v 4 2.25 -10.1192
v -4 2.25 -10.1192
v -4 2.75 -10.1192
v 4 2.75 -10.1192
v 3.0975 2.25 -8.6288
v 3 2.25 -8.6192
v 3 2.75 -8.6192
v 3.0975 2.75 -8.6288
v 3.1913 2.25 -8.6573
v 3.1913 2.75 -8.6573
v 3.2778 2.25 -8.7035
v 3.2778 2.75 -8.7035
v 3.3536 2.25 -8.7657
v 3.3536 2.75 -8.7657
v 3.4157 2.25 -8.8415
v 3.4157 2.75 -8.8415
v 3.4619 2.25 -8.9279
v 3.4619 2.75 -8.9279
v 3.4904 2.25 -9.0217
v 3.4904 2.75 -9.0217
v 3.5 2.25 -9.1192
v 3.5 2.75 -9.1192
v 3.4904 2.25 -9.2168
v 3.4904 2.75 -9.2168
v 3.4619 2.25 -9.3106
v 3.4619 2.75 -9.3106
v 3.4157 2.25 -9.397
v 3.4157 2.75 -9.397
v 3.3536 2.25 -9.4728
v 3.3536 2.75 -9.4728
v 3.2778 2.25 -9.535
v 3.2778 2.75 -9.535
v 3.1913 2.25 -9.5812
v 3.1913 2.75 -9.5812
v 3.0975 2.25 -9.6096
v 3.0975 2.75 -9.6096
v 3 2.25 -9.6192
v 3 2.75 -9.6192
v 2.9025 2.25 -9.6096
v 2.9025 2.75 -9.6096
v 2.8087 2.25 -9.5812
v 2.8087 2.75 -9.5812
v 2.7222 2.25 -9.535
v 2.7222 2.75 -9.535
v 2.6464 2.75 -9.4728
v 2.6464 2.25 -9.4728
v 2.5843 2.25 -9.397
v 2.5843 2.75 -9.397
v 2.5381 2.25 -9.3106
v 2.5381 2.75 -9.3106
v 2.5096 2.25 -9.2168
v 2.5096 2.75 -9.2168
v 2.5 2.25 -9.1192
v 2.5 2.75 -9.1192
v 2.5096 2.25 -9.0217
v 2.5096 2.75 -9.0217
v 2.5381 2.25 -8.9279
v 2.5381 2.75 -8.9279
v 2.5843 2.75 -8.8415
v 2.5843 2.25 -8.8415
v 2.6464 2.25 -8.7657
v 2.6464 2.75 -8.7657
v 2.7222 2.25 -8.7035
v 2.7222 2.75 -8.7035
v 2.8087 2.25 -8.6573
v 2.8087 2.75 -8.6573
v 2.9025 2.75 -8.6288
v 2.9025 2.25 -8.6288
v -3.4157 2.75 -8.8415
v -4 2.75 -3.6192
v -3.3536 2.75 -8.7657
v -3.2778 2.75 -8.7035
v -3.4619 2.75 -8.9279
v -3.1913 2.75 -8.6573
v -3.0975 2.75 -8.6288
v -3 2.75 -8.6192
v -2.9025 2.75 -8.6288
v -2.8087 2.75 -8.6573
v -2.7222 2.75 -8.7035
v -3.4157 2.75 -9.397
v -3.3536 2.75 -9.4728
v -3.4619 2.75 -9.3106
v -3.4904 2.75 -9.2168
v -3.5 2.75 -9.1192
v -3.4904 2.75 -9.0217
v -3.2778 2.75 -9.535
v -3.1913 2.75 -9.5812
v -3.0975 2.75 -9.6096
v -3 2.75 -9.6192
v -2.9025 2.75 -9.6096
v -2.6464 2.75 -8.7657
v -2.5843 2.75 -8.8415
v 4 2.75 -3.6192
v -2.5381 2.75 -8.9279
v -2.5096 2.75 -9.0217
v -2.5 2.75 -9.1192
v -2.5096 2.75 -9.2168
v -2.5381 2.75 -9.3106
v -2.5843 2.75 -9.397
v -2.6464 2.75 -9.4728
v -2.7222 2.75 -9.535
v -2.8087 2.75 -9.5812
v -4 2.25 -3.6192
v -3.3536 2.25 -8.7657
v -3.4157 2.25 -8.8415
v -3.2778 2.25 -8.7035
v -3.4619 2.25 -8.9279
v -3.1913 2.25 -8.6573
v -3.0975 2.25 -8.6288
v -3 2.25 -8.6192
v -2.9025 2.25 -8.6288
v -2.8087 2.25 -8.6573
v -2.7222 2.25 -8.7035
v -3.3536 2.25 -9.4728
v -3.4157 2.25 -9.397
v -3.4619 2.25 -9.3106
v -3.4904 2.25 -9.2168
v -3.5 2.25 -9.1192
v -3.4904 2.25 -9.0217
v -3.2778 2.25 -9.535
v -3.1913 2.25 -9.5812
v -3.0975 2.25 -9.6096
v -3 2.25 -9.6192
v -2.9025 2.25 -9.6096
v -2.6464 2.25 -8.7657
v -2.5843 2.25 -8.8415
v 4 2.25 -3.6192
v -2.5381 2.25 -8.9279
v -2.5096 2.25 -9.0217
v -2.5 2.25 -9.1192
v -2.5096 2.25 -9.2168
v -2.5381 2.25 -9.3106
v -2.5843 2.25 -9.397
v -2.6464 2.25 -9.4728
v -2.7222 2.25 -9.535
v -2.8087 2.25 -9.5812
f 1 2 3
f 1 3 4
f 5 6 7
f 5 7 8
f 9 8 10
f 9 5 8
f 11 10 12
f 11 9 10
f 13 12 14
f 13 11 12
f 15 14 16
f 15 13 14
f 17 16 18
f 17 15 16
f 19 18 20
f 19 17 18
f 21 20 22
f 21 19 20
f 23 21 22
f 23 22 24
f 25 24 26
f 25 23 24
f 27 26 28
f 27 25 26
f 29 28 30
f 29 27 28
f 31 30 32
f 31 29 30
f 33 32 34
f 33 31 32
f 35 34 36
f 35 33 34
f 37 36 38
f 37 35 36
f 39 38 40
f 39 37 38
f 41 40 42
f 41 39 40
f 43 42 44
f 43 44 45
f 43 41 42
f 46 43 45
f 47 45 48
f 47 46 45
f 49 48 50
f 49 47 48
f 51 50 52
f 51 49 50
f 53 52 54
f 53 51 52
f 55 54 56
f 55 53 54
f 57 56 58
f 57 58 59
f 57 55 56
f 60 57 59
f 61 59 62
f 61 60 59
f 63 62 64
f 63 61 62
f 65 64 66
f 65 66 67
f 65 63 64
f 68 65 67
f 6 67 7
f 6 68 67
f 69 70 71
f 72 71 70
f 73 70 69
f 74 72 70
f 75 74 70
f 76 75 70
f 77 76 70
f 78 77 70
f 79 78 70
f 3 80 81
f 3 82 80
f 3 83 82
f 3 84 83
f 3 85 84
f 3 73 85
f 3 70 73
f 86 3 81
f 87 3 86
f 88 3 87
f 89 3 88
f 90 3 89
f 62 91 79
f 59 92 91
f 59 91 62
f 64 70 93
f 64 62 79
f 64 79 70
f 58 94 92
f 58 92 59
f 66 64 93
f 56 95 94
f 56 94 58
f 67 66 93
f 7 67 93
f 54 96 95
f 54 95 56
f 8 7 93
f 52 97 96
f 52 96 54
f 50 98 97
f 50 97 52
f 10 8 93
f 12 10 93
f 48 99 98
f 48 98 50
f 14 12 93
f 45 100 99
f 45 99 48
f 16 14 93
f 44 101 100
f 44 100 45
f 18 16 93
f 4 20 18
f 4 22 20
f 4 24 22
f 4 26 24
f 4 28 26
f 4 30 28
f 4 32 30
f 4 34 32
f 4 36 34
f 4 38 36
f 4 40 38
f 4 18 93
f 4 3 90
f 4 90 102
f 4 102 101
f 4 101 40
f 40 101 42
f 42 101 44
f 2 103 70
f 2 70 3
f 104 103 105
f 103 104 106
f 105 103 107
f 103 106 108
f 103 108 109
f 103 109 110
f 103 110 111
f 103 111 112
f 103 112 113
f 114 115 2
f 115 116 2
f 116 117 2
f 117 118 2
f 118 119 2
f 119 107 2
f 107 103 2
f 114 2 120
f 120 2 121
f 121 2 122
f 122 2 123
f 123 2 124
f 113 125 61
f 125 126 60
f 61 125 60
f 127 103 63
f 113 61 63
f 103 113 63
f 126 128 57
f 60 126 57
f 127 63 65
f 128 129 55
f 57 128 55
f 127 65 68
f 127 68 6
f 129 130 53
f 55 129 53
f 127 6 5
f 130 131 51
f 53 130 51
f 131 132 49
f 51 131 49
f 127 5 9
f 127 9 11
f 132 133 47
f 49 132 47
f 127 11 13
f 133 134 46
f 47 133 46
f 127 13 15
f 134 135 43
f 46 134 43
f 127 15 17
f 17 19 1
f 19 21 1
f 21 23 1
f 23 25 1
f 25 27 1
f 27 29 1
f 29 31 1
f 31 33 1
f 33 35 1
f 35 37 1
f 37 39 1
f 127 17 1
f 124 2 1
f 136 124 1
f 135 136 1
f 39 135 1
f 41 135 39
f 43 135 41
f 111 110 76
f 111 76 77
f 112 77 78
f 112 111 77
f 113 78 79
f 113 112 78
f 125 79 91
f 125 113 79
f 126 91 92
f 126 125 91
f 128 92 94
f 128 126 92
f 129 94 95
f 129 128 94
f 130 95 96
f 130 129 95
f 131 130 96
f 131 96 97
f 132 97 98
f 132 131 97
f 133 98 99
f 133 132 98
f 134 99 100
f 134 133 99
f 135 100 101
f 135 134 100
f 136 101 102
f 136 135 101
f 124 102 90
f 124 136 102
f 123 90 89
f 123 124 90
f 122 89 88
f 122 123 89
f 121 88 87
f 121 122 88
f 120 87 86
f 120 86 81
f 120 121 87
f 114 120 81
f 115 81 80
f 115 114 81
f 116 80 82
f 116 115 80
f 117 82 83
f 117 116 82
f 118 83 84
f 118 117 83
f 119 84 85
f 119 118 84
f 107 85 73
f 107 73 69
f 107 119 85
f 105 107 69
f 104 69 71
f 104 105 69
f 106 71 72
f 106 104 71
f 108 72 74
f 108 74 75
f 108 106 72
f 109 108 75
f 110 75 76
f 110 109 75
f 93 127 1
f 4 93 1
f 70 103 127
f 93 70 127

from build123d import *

# Parameters (mm, degrees)
SKETCH1_W           = 80
SKETCH1_H           = 65
SKETCH1_R           = 5
BOSS_EXTRUDE1_DEPTH = 5
SCALE2_SCALE        = 0.1


with BuildPart() as part:
    # Sketch1 → Boss-Extrude1 (new body)
    with BuildSketch(Plane(origin=(0, 0, 0), x_dir=(1, 0, 0), z_dir=(0, 1, 0))):
        with Locations((0, 7.5)):
            Rectangle(SKETCH1_W, SKETCH1_H)
        with Locations(Location((-30, 30, 0), (0, 0, 270))):
            Circle(SKETCH1_R, mode=Mode.SUBTRACT)
        with Locations(Location((30, 30, 0), (0, 0, 270))):
            Circle(SKETCH1_R, mode=Mode.SUBTRACT)
    extrude(amount=BOSS_EXTRUDE1_DEPTH)


with BuildPart() as part_1:
    # Scale2: scaled about (0, 2.5, -6.799157734)
    add(part.part.scale(SCALE2_SCALE).moved(Location((0, 2.25, -6.119241961))))


solid = part_1.part
